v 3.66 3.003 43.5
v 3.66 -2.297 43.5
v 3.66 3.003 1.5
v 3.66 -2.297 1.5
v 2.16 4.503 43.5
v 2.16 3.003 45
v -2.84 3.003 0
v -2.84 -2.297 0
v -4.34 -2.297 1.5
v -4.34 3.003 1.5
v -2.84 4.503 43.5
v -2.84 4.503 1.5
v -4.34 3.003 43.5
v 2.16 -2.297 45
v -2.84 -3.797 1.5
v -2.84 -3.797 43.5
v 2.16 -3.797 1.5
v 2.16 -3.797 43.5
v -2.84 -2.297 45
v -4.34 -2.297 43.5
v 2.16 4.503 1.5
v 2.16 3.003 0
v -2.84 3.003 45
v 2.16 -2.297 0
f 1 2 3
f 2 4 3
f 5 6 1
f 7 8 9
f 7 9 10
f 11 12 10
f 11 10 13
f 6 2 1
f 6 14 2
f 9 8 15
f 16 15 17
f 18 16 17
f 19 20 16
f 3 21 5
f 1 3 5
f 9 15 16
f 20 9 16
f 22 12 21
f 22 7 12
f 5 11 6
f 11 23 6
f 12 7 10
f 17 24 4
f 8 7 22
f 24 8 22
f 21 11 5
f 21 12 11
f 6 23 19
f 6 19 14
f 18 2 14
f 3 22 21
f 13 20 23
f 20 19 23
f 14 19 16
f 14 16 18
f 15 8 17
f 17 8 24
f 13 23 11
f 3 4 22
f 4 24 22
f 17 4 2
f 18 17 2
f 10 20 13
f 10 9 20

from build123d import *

# Parameters (mm, degrees)
SKETCH1_W           = 8
SKETCH1_H           = 8.3
BOSS_EXTRUDE1_DEPTH = 45
CHAMFER1_SIZE       = 1.5


with BuildPart() as part:
    # Sketch1 → Boss-Extrude1 (new body)
    with BuildSketch(Plane.XY):
        with Locations((-0.340337416, 0.353)):
            Rectangle(SKETCH1_W, SKETCH1_H)
    extrude(amount=BOSS_EXTRUDE1_DEPTH)

    # Chamfer1
    chamfer1_edges = [part.edges().sort_by_distance(p)[0] for p in [
        (3.659662584, 0.353, 45),
        (-0.340337416, 4.503, 45),
        (-4.340337416, 0.353, 45),
        (-0.340337416, 4.503, 0),
        (3.659662584, 0.353, 0),
        (-0.340337416, -3.797, 0),
        (-4.340337416, 0.353, 0),
        (-4.340337416, 4.503, 22.5),
        (3.659662584, 4.503, 22.5),
        (3.659662584, -3.797, 22.5),
        (-4.340337416, -3.797, 22.5),
        (-0.340337416, -3.797, 45),
    ]]
    chamfer(chamfer1_edges, length=CHAMFER1_SIZE)


solid = part.part
